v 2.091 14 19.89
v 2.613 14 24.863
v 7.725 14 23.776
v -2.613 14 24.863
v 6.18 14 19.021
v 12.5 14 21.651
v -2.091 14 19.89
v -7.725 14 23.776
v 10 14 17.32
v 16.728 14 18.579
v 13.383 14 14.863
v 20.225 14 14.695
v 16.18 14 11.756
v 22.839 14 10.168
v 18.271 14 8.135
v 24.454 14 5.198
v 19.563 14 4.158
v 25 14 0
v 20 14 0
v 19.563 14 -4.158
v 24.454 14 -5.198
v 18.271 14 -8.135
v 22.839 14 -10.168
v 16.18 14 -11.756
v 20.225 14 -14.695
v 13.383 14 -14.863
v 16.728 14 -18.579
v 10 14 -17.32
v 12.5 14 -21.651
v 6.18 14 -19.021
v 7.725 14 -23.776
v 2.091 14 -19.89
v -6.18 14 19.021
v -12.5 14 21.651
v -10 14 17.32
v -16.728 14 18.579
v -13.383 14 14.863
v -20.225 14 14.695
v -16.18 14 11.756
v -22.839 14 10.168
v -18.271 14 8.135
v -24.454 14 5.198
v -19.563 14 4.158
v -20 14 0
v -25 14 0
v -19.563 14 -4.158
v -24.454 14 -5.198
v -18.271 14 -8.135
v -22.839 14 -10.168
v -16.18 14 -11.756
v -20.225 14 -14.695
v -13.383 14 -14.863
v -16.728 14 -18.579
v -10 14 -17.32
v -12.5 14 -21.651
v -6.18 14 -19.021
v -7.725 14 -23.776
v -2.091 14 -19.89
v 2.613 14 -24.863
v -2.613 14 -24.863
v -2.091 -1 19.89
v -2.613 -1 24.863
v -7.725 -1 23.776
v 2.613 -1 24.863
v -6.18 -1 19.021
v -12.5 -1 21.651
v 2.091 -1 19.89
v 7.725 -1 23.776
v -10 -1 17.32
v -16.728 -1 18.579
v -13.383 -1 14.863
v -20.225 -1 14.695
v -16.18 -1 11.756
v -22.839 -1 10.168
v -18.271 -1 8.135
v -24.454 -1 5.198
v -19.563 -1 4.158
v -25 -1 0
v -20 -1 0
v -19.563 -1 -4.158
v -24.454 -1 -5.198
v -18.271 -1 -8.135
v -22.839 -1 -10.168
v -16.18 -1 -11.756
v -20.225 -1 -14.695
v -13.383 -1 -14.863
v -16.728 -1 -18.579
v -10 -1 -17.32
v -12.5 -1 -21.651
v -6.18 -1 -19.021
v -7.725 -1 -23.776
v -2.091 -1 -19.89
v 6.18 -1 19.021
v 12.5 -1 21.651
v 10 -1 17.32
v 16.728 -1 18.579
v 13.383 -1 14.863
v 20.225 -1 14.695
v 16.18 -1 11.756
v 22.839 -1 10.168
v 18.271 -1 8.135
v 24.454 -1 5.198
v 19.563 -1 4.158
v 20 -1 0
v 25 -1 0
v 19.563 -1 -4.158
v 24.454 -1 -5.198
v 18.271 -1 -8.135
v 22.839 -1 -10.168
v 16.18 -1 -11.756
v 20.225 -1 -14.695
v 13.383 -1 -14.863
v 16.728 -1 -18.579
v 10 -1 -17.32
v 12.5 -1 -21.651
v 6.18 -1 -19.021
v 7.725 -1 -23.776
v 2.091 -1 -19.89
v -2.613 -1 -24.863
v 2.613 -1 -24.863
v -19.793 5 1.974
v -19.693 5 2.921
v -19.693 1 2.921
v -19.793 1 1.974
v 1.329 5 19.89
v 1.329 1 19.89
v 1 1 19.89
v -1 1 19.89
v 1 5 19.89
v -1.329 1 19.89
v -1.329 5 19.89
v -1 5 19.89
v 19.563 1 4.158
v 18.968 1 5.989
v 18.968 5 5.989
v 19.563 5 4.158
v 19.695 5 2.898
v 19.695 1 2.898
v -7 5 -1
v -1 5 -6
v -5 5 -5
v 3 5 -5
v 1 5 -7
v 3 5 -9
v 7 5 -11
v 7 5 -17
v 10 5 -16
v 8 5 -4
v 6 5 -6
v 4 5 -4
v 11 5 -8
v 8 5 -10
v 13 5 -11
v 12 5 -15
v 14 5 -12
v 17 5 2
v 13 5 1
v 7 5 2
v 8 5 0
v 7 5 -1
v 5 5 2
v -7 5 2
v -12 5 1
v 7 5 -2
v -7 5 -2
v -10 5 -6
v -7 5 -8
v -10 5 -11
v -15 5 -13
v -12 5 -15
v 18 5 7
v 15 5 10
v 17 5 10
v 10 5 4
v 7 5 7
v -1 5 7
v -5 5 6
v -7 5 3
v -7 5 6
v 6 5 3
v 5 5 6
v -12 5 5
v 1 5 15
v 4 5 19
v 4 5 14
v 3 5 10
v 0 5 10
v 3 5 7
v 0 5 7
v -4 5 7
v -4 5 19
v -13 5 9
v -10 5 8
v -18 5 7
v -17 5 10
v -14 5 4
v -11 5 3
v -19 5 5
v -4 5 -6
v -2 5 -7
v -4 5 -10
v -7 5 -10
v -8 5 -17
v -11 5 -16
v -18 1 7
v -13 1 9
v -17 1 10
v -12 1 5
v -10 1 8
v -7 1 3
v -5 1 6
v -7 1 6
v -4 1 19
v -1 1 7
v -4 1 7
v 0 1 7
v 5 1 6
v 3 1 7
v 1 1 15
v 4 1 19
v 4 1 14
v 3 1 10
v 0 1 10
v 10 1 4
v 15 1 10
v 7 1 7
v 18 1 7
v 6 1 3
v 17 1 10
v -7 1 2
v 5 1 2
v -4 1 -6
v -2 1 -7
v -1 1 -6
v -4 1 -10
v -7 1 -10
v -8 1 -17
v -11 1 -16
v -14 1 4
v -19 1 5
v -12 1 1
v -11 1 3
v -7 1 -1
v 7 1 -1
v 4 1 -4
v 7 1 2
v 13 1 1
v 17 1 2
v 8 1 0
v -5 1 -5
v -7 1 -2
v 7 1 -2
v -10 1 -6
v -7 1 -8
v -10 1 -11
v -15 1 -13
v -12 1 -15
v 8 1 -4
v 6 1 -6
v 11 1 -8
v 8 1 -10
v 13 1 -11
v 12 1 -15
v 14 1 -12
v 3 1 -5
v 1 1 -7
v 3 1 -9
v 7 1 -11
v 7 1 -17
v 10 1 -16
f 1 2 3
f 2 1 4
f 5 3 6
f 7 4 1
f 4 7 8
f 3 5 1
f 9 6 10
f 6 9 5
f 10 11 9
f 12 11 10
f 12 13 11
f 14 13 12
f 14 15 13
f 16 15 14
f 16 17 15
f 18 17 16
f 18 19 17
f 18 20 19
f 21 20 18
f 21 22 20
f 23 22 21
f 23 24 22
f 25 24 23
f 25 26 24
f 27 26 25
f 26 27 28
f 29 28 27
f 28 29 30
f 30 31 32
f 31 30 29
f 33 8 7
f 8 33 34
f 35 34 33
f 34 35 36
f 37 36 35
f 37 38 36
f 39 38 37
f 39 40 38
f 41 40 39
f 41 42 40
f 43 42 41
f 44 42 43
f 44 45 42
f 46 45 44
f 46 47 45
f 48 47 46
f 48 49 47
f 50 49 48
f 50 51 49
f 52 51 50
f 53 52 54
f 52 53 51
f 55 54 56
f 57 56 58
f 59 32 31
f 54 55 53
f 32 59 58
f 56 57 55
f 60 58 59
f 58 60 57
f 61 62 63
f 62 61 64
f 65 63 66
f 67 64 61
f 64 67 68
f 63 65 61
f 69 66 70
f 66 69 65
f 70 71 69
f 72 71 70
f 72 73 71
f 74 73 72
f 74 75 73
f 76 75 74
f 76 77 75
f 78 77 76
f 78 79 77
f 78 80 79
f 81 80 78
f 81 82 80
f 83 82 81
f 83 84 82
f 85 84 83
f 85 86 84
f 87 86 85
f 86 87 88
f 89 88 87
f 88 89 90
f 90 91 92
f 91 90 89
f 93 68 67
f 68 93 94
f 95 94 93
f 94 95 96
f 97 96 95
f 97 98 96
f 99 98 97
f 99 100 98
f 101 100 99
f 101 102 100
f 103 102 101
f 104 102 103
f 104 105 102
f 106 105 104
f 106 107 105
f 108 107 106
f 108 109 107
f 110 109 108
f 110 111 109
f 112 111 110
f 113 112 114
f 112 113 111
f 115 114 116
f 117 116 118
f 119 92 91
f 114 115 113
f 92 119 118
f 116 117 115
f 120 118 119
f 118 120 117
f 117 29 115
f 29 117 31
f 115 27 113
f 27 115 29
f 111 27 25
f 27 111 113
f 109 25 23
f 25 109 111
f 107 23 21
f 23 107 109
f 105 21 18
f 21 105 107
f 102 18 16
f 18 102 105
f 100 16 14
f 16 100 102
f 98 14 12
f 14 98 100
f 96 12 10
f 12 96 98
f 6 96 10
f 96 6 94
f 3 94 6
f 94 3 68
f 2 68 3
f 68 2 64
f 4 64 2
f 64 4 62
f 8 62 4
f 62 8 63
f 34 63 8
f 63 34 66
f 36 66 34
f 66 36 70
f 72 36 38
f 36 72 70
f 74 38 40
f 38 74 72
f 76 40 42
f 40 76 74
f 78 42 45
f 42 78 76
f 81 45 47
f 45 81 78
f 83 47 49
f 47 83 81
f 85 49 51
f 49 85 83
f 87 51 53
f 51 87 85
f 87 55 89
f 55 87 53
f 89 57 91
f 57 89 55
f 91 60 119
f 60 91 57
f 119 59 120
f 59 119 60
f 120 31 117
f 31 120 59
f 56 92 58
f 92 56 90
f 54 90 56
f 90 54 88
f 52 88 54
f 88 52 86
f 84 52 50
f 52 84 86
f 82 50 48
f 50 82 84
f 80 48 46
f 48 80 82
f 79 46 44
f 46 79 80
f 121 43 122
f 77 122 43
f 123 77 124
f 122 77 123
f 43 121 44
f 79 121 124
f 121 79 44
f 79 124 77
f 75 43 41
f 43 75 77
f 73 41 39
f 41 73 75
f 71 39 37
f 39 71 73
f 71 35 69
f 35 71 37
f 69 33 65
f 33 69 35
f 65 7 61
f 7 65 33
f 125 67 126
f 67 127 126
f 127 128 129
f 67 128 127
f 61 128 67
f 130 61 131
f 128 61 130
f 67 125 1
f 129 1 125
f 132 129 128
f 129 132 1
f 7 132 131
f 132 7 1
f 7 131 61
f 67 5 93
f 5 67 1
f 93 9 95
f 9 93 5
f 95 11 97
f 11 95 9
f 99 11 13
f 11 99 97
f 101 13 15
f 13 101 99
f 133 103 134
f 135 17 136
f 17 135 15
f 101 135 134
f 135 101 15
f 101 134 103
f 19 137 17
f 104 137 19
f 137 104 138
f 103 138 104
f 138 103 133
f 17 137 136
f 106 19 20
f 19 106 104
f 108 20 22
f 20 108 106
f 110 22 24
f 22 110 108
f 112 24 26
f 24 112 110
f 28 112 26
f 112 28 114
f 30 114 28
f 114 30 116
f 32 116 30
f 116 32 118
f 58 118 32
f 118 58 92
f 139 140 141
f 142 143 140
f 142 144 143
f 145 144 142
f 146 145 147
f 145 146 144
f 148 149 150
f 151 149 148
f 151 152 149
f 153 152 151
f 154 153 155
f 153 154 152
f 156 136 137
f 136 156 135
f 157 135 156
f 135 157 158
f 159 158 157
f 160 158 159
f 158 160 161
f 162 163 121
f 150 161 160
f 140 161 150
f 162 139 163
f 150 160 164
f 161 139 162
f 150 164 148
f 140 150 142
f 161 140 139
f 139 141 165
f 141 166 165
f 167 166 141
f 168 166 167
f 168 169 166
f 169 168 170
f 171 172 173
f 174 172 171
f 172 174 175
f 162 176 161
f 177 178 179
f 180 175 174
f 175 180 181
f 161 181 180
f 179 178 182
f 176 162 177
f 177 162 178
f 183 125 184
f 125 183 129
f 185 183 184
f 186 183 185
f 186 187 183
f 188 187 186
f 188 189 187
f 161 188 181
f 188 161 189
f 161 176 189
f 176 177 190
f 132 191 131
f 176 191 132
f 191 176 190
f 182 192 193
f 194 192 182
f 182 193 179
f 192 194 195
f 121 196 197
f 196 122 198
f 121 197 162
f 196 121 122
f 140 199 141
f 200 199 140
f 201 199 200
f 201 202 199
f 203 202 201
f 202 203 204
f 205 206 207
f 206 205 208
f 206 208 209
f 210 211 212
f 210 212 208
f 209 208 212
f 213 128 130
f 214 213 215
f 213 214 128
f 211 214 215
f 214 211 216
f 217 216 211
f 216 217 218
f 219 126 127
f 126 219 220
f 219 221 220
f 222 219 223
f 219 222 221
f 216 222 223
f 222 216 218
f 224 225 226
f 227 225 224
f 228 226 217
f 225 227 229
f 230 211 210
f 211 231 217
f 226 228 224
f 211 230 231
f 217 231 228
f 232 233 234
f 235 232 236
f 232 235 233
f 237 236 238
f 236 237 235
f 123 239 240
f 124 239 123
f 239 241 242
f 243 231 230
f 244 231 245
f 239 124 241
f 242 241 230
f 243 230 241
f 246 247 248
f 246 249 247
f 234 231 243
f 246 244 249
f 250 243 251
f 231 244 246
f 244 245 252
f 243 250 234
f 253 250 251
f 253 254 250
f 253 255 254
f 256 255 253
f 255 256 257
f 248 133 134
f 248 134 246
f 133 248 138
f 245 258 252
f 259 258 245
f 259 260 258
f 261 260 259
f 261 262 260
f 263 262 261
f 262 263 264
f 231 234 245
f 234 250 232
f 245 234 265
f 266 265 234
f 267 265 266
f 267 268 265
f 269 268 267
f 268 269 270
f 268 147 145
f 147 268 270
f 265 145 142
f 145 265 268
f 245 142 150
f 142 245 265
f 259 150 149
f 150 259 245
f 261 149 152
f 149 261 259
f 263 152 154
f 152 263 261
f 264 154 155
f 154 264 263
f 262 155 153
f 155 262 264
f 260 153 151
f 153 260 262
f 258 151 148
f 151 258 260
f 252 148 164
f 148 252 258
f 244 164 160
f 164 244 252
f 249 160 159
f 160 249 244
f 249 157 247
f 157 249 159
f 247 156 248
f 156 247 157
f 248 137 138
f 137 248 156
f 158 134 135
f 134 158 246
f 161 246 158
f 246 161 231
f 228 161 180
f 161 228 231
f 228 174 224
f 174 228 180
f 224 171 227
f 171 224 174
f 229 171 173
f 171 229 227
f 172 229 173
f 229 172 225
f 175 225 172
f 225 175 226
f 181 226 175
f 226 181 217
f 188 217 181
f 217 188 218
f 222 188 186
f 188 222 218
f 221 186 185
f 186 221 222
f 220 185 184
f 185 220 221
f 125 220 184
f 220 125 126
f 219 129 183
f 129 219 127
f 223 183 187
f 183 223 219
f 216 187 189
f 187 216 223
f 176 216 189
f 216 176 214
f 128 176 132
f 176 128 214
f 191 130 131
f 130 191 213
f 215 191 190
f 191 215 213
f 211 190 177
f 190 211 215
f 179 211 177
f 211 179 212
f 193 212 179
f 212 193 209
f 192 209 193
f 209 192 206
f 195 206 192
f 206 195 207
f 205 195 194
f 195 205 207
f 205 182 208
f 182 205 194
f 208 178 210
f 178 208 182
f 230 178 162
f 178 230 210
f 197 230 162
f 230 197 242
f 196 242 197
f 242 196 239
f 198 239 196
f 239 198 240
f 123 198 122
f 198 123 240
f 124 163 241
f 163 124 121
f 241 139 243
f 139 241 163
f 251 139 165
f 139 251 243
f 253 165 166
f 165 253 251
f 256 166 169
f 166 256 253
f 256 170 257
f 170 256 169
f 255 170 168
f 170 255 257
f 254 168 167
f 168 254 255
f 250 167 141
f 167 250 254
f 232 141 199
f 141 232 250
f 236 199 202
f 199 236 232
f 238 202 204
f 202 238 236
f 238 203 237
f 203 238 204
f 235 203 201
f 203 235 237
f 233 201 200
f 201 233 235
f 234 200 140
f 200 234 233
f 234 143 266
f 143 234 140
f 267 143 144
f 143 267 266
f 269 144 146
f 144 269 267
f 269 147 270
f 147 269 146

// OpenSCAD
//start
module  module1() 
{ 
color  ([0.4,1,1]) 
{ 
            polygon(points = [
[-27.00,19.00]
,[-32.00,21.00]
,[-40.00,22.00]
,[-39.00,25.00]
,[-34.00,24.00]
,[-31.00,23.00]
,[-27.00,22.00]
,[-27.00,23.00]
,[-32.00,25.00]
,[-38.00,27.00]
,[-37.00,30.00]
,[-33.00,29.00]
,[-30.00,28.00]
,[-27.00,26.00]
,[-25.00,26.00]
,[-24.00,27.00]
,[-24.00,29.00]
,[-24.00,35.00]
,[-24.00,39.00]
,[-21.00,40.00]
,[-21.00,30.00]
,[-21.00,27.00]
,[-20.00,27.00]
,[-20.00,30.00]
,[-19.00,35.00]
,[-19.00,39.00]
,[-19.00,40.00]
,[-16.00,39.00]
,[-16.00,34.00]
,[-17.00,30.00]
,[-17.00,27.00]
,[-15.00,26.00]
,[-13.00,27.00]
,[-5.00,30.00]
,[-3.00,30.00]
,[-2.00,27.00]
,[-10.00,24.00]
,[-14.00,23.00]
,[-15.00,22.00]
,[-13.00,22.00]
,[-10.00,23.00]
,[-7.00,24.00]
,[-1.00,26.00]
,[0.00,23.00]
,[-3.00,22.00]
,[-7.00,21.00]
,[-12.00,20.00]
,[-13.00,19.00]
,[-13.00,18.00]
,[-12.00,16.00]
,[-9.00,12.00]
,[-7.00,9.00]
,[-6.00,8.00]
,[-8.00,5.00]
,[-12.00,10.00]
,[-14.00,14.00]
,[-16.00,16.00]
,[-17.00,15.00]
,[-15.00,12.00]
,[-13.00,9.00]
,[-10.00,4.00]
,[-13.00,3.00]
,[-17.00,11.00]
,[-19.00,13.00]
,[-21.00,14.00]
,[-22.00,13.00]
,[-24.00,10.00]
,[-28.00,3.00]
,[-31.00,4.00]
,[-29.00,7.00]
,[-27.00,10.00]
,[-24.00,14.00]
,[-25.00,15.00]
,[-27.00,12.00]
,[-30.00,9.00]
,[-32.00,5.00]
,[-35.00,7.00]
,[-30.00,14.00]
,[-27.00,18.00]
]
,paths = [
[0,1,2,3,4,5,6,7,8,9,10,11,12,13,14,15,16,17,18,19,20,21,22,23,24,25,26,27,28,29,30,31,32,33,34,35,36,37,38,39,40,41,42,43,44,45,46,47,48,49,50,51,52,53,54,55,56,57,58,59,60,61,62,63,64,65,66,67,68,69,70,71,72,73,74,75,76,77,78]]
            );
}
}
module tire(){
 difference(){
 
	circle(r=25);


	circle(r=20);
}
}
translate([0,14,0]){
rotate(a=[90,0,0]){
linear_extrude(height=15){
tire();
}
}
}
translate([20,5,-20]){
rotate(a=[90,0,0]){
linear_extrude(height = 4){
module1();
}
}
}
